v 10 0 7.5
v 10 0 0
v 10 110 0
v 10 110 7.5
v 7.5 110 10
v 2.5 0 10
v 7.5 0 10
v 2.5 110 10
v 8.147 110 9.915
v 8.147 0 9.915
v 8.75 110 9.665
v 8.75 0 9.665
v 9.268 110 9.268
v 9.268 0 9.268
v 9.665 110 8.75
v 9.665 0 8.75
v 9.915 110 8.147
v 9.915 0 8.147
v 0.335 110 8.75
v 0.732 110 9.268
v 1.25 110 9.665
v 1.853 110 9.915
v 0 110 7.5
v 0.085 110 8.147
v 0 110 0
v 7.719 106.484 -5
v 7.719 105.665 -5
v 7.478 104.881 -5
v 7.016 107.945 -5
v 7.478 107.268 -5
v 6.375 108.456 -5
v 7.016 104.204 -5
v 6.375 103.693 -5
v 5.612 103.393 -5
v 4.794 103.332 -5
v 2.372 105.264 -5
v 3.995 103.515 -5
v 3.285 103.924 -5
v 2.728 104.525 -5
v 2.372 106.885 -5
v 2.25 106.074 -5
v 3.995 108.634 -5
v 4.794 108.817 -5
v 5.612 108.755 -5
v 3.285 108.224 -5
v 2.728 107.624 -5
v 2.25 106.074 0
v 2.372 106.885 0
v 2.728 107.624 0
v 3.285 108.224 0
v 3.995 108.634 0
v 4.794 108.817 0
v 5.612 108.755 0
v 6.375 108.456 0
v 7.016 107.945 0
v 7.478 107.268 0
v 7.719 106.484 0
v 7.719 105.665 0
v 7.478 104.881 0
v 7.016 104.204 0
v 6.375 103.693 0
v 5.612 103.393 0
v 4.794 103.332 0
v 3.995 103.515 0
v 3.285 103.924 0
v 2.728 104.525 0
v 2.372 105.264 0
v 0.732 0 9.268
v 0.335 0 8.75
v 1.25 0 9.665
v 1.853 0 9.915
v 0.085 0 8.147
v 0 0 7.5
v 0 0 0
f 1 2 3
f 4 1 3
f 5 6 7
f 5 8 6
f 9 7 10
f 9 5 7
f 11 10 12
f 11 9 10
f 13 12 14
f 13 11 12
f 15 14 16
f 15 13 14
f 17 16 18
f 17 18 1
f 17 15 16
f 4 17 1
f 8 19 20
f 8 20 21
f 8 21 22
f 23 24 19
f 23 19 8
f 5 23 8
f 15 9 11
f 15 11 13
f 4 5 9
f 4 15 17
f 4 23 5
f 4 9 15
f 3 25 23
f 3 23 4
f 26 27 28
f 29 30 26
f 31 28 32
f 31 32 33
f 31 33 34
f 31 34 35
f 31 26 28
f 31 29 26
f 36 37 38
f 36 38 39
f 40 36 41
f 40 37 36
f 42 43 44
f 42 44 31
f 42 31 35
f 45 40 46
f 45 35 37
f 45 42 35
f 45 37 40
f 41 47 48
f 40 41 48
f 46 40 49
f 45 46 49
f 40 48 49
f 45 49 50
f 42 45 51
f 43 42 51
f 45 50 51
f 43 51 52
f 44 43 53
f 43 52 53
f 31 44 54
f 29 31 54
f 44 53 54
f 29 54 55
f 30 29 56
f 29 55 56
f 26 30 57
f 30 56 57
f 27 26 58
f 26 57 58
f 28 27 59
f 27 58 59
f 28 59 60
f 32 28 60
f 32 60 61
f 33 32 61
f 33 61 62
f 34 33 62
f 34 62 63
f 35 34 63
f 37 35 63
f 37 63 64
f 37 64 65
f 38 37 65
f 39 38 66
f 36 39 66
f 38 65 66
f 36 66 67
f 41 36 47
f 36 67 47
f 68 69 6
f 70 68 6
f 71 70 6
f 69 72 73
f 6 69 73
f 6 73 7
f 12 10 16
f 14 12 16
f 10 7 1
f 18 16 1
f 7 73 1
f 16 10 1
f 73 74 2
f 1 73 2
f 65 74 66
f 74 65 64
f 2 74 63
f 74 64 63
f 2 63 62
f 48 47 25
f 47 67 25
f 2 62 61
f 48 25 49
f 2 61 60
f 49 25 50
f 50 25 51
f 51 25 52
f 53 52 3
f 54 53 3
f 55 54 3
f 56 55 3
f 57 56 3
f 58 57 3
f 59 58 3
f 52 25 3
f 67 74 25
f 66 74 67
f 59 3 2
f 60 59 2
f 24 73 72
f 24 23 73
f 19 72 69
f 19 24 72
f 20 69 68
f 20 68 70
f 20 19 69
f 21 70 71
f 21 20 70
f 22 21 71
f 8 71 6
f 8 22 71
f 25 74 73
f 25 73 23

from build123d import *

# Parameters (mm, degrees)
SKETCH2_W           = 10
SKETCH2_H           = 110
BOSS_EXTRUDE1_DEPTH = 10
SKETCH3_R           = 2.75
BOSS_EXTRUDE2_DEPTH = 5
FILLET2_R           = 2.5


with BuildPart() as part:
    # Sketch2 → Boss-Extrude1 (new body)
    with BuildSketch(Plane.XY):
        with Locations((5, 55)):
            Rectangle(SKETCH2_W, SKETCH2_H)
    extrude(amount=BOSS_EXTRUDE1_DEPTH)

    # Sketch3 → Boss-Extrude2 (add)
    with BuildSketch(Plane(origin=(0, 0, 0), x_dir=(-1, 0, 0), z_dir=(0, 0, -1))):
        with Locations((-5, 106.074407224)):
            Circle(SKETCH3_R)
    extrude(amount=BOSS_EXTRUDE2_DEPTH)

    # Fillet2
    fillet2_edges = [part.edges().sort_by_distance(p)[0] for p in [
        (0, 55, 10),
        (10, 55, 10),
    ]]
    fillet(fillet2_edges, radius=FILLET2_R)


solid = part.part
